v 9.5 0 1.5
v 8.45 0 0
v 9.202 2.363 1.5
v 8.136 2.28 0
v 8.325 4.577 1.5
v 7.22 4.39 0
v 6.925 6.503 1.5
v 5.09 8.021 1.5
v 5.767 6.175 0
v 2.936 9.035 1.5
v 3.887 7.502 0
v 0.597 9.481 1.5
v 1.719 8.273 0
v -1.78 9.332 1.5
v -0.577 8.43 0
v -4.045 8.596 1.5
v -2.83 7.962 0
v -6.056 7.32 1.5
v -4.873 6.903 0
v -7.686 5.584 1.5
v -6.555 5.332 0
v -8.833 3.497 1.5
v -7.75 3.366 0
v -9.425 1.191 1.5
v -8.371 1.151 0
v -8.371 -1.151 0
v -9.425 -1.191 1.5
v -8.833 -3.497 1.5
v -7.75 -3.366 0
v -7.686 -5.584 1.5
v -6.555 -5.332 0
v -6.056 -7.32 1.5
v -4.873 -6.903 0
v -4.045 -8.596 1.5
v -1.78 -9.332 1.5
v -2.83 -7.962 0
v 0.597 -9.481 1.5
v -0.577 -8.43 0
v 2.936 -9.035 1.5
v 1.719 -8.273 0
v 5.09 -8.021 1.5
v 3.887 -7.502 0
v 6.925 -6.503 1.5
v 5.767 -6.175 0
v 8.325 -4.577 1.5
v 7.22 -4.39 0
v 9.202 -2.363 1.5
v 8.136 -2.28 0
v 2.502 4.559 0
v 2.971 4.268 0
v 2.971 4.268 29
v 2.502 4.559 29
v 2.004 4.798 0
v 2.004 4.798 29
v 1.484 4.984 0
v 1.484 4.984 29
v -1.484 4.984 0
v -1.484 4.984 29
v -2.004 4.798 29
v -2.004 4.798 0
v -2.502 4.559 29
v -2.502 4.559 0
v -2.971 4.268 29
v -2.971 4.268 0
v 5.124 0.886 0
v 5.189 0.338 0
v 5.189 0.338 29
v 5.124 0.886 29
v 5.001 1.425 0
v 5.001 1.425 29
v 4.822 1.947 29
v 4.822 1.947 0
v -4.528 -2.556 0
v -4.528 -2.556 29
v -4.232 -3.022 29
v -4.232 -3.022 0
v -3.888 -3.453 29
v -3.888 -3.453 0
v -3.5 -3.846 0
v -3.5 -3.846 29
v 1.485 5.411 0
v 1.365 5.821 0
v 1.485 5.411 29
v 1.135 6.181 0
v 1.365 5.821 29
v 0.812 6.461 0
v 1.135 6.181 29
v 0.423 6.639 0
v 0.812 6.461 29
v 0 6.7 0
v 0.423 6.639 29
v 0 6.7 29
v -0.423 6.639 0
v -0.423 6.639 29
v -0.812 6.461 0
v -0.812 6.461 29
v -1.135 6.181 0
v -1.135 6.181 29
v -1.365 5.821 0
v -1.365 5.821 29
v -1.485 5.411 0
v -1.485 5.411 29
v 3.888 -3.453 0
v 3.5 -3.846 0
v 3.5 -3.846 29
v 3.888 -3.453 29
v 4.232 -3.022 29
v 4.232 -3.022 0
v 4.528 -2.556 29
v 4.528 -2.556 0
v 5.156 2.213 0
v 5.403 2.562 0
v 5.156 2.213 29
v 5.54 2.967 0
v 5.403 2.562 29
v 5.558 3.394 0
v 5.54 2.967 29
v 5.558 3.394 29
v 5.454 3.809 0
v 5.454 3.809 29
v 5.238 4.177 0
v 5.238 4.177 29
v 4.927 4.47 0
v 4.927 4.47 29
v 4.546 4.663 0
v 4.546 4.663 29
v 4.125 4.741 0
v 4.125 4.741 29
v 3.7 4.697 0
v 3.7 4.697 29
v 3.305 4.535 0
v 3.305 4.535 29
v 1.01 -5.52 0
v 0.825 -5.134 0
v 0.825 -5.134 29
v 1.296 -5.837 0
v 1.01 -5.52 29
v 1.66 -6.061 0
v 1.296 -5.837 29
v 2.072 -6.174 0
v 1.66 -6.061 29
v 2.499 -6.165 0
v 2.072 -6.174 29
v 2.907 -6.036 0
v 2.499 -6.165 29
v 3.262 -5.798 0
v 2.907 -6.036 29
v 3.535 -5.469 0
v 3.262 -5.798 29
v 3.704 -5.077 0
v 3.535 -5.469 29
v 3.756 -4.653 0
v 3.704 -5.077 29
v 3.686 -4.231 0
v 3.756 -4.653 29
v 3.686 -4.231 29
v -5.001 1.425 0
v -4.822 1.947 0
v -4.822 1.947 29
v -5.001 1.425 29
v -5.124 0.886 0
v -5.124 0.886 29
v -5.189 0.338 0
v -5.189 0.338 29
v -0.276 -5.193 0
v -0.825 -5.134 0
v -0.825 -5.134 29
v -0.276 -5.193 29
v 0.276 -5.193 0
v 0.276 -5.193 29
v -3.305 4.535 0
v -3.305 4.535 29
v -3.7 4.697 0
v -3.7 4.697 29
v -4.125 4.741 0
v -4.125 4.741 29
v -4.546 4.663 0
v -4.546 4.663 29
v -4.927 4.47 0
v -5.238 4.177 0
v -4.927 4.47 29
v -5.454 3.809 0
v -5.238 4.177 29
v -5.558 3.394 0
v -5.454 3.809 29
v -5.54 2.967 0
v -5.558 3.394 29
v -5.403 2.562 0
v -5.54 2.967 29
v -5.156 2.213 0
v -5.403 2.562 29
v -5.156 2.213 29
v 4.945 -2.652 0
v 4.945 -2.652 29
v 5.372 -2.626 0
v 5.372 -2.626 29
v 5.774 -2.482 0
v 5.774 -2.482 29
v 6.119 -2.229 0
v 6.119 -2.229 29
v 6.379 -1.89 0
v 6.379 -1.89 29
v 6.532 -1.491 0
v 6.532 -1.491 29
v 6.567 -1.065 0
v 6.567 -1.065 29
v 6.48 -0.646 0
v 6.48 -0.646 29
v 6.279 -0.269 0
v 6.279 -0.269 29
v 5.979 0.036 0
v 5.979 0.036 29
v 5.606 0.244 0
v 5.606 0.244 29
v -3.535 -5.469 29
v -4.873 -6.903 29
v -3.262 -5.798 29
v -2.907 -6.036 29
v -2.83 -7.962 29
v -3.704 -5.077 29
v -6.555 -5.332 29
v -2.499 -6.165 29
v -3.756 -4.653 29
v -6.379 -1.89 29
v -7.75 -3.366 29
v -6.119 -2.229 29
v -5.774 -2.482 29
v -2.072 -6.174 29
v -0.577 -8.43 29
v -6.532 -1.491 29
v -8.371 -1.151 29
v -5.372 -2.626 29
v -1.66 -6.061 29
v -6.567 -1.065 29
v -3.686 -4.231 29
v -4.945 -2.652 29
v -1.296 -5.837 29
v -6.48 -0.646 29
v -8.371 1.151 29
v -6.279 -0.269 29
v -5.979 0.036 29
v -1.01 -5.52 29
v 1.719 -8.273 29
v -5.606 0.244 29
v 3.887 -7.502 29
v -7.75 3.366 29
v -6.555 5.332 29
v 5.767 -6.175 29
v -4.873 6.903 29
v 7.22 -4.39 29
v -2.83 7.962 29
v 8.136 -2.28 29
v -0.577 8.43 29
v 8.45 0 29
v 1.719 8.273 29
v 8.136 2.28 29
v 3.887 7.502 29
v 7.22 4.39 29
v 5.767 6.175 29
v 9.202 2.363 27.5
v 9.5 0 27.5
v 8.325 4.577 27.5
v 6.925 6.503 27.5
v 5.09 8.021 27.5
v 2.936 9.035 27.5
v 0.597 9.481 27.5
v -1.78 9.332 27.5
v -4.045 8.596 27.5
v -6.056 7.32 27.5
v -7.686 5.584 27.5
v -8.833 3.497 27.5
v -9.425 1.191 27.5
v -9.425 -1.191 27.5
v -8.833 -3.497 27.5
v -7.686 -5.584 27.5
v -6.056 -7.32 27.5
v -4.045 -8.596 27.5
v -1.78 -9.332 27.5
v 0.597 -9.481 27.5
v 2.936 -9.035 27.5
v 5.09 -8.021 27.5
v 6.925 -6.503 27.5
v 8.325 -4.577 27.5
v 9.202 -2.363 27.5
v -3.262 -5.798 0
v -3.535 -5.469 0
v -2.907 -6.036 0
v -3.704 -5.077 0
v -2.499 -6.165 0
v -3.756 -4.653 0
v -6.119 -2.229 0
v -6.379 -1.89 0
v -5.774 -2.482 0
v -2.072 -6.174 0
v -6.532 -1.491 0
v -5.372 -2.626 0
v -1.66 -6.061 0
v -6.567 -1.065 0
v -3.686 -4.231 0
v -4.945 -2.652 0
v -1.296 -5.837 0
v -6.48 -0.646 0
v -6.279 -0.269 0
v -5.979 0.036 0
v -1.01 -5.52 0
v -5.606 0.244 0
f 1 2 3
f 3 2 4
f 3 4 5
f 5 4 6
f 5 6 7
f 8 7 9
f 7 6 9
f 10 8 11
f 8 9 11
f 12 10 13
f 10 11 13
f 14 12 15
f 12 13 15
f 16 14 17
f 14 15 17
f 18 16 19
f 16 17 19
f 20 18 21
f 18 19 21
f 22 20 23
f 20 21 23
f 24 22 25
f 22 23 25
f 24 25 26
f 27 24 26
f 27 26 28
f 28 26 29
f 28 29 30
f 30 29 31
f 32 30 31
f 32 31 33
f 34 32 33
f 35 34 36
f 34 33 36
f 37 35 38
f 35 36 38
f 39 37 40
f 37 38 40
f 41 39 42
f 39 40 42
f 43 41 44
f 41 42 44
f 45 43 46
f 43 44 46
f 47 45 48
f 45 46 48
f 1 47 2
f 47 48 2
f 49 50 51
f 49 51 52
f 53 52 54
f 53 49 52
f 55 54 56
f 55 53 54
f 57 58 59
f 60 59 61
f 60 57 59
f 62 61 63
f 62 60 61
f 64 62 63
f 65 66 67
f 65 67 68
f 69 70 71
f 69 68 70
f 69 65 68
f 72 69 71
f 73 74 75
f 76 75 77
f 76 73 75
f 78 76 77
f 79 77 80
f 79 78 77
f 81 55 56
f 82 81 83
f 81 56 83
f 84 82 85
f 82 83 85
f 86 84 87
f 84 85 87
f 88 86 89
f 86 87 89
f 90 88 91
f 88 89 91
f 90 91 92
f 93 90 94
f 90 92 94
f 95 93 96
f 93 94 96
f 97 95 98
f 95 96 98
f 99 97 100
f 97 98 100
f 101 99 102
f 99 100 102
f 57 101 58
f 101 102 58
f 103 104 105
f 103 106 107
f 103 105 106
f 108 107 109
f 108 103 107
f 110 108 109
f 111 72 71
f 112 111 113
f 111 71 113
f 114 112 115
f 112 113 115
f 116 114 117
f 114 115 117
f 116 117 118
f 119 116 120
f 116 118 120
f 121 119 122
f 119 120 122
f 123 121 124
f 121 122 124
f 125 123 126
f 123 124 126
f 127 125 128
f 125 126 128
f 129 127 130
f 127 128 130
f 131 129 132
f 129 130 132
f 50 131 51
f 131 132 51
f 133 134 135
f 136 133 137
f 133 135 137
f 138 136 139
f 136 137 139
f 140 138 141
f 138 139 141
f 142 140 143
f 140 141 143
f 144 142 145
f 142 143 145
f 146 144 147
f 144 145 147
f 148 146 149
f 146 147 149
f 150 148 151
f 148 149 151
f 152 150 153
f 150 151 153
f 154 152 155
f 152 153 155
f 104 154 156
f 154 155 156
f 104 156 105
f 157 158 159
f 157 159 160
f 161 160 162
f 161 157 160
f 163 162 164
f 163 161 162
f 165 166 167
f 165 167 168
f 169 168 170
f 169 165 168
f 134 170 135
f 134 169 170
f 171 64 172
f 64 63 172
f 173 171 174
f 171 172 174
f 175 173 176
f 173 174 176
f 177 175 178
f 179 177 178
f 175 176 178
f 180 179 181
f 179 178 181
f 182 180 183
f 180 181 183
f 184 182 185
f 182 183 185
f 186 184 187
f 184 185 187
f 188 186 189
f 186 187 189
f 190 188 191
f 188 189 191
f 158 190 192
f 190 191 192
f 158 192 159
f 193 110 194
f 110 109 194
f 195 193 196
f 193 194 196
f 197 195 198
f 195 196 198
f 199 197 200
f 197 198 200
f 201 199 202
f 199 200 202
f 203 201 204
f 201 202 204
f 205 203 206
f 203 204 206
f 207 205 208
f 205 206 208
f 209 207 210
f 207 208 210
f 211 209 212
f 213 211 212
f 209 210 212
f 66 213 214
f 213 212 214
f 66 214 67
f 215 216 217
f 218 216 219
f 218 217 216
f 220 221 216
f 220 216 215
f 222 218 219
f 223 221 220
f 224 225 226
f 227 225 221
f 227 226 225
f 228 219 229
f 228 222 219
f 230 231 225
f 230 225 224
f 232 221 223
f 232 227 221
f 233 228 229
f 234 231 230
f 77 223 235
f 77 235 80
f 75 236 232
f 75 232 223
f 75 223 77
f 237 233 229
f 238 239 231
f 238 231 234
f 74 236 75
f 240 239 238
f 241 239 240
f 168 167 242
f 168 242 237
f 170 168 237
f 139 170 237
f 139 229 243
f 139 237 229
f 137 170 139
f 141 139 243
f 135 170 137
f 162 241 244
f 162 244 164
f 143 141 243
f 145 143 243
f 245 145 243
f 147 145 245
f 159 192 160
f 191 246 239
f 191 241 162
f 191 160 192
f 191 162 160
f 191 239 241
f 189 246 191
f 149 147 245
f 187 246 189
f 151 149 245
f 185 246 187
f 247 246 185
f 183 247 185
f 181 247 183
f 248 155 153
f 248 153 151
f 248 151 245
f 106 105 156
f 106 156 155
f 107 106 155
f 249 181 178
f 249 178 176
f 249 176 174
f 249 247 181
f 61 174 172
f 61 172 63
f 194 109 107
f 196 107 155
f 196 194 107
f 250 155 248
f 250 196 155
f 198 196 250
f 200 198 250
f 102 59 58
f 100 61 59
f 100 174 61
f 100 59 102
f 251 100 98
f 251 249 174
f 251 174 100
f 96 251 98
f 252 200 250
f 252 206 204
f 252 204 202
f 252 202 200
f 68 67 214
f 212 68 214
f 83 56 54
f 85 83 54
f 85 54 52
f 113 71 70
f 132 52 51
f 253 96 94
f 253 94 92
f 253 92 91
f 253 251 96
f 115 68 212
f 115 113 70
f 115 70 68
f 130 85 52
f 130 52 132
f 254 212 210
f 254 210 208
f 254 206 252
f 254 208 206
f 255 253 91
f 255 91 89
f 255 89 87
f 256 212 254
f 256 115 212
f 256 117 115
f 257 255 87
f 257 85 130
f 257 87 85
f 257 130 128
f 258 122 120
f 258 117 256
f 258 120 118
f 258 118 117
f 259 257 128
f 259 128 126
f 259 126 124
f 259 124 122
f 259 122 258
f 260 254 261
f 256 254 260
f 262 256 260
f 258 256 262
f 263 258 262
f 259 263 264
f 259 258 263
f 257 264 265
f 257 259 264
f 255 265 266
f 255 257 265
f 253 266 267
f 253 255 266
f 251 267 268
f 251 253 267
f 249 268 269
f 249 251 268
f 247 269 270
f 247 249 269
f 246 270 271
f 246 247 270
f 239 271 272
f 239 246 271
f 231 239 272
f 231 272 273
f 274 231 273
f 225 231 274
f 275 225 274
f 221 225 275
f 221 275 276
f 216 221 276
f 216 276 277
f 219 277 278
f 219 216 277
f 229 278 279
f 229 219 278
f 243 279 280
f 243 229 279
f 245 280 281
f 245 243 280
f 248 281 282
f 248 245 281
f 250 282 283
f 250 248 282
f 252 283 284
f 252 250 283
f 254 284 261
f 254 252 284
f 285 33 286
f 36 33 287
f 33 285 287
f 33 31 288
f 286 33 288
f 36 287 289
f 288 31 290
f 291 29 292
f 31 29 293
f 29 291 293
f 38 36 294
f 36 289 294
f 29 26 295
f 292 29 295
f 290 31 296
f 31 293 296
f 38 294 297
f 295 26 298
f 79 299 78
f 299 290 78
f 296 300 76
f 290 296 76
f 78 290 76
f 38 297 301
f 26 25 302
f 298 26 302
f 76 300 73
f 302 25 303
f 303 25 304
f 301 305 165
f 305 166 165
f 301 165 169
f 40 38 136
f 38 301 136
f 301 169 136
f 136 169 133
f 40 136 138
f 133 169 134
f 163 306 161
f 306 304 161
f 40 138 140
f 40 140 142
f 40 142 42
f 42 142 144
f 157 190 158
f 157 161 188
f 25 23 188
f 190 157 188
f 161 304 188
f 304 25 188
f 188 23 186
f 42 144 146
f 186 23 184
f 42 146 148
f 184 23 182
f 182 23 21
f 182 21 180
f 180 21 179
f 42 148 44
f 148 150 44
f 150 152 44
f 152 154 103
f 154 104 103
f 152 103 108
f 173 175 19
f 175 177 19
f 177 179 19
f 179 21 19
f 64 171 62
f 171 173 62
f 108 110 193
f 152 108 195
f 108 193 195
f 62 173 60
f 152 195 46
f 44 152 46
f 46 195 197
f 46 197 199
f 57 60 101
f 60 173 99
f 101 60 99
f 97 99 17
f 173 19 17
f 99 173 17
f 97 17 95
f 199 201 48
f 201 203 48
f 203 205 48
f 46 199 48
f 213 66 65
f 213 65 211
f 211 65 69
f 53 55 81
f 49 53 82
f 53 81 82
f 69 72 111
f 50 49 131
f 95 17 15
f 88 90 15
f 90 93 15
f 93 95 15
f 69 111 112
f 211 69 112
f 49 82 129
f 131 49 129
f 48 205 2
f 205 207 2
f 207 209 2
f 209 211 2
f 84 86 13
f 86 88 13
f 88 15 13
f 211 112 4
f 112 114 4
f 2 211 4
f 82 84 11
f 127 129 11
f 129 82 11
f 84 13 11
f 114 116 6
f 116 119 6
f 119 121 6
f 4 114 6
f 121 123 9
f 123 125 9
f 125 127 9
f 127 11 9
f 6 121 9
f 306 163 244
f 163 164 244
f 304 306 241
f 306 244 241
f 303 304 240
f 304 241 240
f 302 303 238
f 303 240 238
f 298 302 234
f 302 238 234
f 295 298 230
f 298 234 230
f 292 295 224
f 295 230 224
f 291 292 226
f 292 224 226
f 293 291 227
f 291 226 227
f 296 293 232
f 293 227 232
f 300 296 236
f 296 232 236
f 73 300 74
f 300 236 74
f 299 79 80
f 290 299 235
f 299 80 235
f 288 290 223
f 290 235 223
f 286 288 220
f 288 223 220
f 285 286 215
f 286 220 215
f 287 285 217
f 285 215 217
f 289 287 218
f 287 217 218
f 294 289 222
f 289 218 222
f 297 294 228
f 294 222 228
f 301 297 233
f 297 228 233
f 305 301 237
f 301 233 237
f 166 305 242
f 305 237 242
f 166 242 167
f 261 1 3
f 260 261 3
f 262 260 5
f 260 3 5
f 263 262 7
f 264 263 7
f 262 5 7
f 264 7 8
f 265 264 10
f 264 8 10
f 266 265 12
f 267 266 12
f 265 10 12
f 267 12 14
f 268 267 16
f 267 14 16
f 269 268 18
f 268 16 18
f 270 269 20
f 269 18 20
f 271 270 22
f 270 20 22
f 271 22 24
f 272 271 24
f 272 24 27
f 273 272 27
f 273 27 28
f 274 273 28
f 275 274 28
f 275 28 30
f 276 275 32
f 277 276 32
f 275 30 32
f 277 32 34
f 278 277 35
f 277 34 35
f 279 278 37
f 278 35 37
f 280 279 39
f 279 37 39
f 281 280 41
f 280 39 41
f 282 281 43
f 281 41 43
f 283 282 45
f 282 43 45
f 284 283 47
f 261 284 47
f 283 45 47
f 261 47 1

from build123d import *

# Parameters (mm, degrees)
SKETCH1_R           = 9.5
SKETCH1_R_2         = 5.2
BOSS_EXTRUDE1_DEPTH = 29
SKETCH2_R           = 1.5
CUT_EXTRUDE1_DEPTH  = 30
CIRPATTERN1_COUNT   = 7
CHAMFER1_SIZE       = 1.5
CHAMFER1_SIZE2      = 1.050311307


with BuildPart() as part:
    # Sketch1 → Boss-Extrude1 (new body)
    with BuildSketch(Plane.XY):
        Circle(SKETCH1_R)
        Circle(SKETCH1_R_2, mode=Mode.SUBTRACT)
    extrude(amount=BOSS_EXTRUDE1_DEPTH)

    # Sketch2 → Cut-Extrude1 (cut, through all)
    with BuildSketch(Plane.XY.offset(29)):
        with Locations((0, 5.2)):
            Circle(SKETCH2_R)
    cut_extrude1 = extrude(amount=-CUT_EXTRUDE1_DEPTH, mode=Mode.SUBTRACT)

    # CirPattern1: Cut-Extrude1 ×7 about axis
    cirpattern1_axis = Axis((0, 0, 0), (0, 0, 1))
    for i in range(1, CIRPATTERN1_COUNT):
        add(cut_extrude1.rotate(cirpattern1_axis, i * 360 / CIRPATTERN1_COUNT), mode=Mode.SUBTRACT)

    # Chamfer1
    chamfer1_edges = [part.edges().sort_by_distance(p)[0] for p in [
        (-9.5, 0, 0),
        (-9.5, 0, 29),
    ]]
    chamfer1_side = [part.faces().sort_by_distance(p)[0] for p in [
        (-9.5, 0, 14.5),
    ]]
    chamfer(chamfer1_edges, length=CHAMFER1_SIZE, length2=CHAMFER1_SIZE2, reference=chamfer1_side[0])


solid = part.part
